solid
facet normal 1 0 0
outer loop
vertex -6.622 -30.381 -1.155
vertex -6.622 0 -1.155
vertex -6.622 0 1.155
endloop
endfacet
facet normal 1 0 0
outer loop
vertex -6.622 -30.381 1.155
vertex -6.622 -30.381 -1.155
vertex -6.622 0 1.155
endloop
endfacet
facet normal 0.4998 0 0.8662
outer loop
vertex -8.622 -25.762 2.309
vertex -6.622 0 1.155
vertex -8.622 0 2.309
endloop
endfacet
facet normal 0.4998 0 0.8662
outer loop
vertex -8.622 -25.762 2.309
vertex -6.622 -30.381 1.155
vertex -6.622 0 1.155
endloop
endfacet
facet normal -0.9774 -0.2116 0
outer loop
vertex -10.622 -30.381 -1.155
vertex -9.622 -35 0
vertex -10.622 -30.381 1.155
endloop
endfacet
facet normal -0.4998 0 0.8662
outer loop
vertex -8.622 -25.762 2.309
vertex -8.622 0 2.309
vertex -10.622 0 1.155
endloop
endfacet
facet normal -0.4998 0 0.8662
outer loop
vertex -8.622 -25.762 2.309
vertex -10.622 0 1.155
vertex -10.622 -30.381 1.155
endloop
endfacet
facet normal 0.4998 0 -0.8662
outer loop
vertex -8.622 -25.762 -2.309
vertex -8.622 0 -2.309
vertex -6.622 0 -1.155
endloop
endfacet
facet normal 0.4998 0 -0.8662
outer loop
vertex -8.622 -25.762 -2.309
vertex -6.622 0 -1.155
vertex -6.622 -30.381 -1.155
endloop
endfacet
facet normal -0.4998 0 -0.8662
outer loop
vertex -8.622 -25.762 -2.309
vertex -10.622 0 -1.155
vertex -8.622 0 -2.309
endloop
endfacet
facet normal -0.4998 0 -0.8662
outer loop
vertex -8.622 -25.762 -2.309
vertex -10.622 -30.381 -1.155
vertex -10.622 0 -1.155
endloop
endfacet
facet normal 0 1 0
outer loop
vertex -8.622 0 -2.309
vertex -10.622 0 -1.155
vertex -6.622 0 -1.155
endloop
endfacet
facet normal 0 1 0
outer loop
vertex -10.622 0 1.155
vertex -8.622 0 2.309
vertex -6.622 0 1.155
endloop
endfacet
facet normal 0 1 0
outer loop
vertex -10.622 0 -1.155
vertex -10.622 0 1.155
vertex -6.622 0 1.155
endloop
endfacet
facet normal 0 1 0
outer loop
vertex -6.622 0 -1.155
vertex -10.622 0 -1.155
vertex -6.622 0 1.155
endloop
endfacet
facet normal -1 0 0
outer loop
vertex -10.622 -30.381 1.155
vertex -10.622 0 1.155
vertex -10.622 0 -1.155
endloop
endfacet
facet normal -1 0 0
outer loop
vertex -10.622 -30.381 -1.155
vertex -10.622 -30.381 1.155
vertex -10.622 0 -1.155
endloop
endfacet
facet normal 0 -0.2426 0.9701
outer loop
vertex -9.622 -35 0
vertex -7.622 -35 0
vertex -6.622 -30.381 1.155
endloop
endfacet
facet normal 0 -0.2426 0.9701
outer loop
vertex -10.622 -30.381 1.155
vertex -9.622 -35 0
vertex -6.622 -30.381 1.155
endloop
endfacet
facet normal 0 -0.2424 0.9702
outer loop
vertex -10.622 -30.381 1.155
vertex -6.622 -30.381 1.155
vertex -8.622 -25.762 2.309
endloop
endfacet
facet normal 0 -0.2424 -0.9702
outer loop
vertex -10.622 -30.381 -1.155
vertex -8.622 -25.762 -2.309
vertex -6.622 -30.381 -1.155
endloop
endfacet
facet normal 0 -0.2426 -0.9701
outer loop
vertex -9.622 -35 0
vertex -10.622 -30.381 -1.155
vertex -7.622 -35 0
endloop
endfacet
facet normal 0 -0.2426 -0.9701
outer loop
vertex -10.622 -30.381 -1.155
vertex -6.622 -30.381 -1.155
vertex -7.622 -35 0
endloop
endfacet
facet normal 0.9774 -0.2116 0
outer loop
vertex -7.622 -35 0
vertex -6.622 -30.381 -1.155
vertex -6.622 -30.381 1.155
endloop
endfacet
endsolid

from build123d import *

# Parameters (mm, degrees)
F1_DEPTH      = 35
F3_DEPTH      = 4.001
F5_DEPTH      = 2.3104010768
F5_DEPTH_BACK = 2.3104010768


with BuildPart() as f1:
    # F0 (on Front) → F1 (new body)
    with BuildSketch(Plane.XZ):
        Polygon((-6.6223553988, -1.1547005384), (-6.6223553988, 1.1547005384), (-8.6223553988, 2.3094010768), (-10.6223553988, 1.1547005384), (-10.6223553988, -1.1547005384), (-8.6223553988, -2.3094010768), align=None)
    extrude(amount=F1_DEPTH)

    # F2 (on face) → F3 (cut, through all)
    with BuildSketch(Plane.YZ.offset(-6.6223553988)):
        Polygon((-35, 2.5), (-35, 0), (-25, 2.5), align=None)
        Polygon((-25, -2.5), (-35, 0), (-35, -2.5), align=None)
    extrude(amount=-F3_DEPTH, mode=Mode.SUBTRACT)

    # F4 (on Top) → F5 (cut, two sides)
    with BuildSketch(Plane.XY) as f5_sk:
        Polygon((-6.6223553988, -35), (-6.6223553988, -30.3811978465), (-7.6223553988, -35), align=None)
        Polygon((-10.6223553988, -35), (-9.6223553988, -35), (-10.6223553988, -30.3811978465), align=None)
    extrude(amount=-F5_DEPTH, mode=Mode.SUBTRACT)
    extrude(f5_sk.sketch, amount=F5_DEPTH_BACK, mode=Mode.SUBTRACT)


solid = f1.part
